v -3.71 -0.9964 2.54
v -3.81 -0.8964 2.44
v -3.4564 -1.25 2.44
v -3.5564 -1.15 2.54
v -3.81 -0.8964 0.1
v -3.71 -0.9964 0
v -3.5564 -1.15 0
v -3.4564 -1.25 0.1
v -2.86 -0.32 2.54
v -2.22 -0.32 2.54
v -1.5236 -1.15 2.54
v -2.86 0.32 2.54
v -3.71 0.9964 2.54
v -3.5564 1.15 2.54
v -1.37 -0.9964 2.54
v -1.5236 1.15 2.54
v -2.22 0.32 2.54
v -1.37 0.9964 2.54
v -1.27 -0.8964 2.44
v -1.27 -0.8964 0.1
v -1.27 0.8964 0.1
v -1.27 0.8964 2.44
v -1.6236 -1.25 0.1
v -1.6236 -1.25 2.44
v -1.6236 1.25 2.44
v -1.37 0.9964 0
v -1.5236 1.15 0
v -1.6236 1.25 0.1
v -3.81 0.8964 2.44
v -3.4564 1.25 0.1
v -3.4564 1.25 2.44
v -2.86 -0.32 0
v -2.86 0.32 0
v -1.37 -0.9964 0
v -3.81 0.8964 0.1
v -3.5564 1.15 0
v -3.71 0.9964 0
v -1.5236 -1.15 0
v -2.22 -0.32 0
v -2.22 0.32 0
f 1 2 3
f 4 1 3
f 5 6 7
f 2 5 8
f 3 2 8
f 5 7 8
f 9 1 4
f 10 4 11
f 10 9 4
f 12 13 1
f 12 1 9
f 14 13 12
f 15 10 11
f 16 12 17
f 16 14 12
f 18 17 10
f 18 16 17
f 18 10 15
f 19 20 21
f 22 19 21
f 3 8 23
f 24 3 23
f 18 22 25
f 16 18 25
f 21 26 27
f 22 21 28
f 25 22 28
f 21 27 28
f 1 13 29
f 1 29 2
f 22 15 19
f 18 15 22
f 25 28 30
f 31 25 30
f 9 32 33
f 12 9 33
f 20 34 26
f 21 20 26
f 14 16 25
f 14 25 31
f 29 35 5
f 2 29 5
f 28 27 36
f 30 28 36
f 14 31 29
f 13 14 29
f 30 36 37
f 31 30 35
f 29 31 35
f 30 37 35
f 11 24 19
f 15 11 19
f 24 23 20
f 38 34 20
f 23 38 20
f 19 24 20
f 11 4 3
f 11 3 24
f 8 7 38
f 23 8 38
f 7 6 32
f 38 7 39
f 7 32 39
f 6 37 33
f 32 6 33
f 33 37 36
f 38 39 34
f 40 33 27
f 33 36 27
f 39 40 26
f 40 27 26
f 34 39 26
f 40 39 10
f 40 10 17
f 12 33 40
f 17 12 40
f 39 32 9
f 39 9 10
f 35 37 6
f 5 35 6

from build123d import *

# Parameters (mm, degrees)
MODEL_W         = 0.64
MODEL_H         = 0.64
EXTRUDE_1_DEPTH = 2.54
CHAMFER_1_SIZE  = 0.1


with BuildPart() as part:
    # Model → Бобышка-Вытянуть1 (new body)
    with BuildSketch(Plane.XY):
        Polygon((-1.27, -0.896446609), (-1.27, 0.896446609), (-1.623553391, 1.25), (-3.456446609, 1.25), (-3.81, 0.896446609), (-3.81, -0.896446609), (-3.456446609, -1.25), (-1.623553391, -1.25), align=None)
        with Locations((-2.54, 0)):
            Rectangle(MODEL_W, MODEL_H, mode=Mode.SUBTRACT)
    extrude(amount=EXTRUDE_1_DEPTH)

    # Фаска1
    chamfer_1_edges = [part.edges().sort_by_distance(p)[0] for p in [
        (-1.27, 0, 0),
        (-2.54, 1.25, 2.54),
        (-3.81, 0, 2.54),
        (-2.54, -1.25, 2.54),
        (-1.27, 0, 2.54),
        (-2.54, -1.25, 0),
        (-3.81, 0, 0),
        (-2.54, 1.25, 0),
    ]]
    chamfer(chamfer_1_edges, length=CHAMFER_1_SIZE)


solid = part.part
